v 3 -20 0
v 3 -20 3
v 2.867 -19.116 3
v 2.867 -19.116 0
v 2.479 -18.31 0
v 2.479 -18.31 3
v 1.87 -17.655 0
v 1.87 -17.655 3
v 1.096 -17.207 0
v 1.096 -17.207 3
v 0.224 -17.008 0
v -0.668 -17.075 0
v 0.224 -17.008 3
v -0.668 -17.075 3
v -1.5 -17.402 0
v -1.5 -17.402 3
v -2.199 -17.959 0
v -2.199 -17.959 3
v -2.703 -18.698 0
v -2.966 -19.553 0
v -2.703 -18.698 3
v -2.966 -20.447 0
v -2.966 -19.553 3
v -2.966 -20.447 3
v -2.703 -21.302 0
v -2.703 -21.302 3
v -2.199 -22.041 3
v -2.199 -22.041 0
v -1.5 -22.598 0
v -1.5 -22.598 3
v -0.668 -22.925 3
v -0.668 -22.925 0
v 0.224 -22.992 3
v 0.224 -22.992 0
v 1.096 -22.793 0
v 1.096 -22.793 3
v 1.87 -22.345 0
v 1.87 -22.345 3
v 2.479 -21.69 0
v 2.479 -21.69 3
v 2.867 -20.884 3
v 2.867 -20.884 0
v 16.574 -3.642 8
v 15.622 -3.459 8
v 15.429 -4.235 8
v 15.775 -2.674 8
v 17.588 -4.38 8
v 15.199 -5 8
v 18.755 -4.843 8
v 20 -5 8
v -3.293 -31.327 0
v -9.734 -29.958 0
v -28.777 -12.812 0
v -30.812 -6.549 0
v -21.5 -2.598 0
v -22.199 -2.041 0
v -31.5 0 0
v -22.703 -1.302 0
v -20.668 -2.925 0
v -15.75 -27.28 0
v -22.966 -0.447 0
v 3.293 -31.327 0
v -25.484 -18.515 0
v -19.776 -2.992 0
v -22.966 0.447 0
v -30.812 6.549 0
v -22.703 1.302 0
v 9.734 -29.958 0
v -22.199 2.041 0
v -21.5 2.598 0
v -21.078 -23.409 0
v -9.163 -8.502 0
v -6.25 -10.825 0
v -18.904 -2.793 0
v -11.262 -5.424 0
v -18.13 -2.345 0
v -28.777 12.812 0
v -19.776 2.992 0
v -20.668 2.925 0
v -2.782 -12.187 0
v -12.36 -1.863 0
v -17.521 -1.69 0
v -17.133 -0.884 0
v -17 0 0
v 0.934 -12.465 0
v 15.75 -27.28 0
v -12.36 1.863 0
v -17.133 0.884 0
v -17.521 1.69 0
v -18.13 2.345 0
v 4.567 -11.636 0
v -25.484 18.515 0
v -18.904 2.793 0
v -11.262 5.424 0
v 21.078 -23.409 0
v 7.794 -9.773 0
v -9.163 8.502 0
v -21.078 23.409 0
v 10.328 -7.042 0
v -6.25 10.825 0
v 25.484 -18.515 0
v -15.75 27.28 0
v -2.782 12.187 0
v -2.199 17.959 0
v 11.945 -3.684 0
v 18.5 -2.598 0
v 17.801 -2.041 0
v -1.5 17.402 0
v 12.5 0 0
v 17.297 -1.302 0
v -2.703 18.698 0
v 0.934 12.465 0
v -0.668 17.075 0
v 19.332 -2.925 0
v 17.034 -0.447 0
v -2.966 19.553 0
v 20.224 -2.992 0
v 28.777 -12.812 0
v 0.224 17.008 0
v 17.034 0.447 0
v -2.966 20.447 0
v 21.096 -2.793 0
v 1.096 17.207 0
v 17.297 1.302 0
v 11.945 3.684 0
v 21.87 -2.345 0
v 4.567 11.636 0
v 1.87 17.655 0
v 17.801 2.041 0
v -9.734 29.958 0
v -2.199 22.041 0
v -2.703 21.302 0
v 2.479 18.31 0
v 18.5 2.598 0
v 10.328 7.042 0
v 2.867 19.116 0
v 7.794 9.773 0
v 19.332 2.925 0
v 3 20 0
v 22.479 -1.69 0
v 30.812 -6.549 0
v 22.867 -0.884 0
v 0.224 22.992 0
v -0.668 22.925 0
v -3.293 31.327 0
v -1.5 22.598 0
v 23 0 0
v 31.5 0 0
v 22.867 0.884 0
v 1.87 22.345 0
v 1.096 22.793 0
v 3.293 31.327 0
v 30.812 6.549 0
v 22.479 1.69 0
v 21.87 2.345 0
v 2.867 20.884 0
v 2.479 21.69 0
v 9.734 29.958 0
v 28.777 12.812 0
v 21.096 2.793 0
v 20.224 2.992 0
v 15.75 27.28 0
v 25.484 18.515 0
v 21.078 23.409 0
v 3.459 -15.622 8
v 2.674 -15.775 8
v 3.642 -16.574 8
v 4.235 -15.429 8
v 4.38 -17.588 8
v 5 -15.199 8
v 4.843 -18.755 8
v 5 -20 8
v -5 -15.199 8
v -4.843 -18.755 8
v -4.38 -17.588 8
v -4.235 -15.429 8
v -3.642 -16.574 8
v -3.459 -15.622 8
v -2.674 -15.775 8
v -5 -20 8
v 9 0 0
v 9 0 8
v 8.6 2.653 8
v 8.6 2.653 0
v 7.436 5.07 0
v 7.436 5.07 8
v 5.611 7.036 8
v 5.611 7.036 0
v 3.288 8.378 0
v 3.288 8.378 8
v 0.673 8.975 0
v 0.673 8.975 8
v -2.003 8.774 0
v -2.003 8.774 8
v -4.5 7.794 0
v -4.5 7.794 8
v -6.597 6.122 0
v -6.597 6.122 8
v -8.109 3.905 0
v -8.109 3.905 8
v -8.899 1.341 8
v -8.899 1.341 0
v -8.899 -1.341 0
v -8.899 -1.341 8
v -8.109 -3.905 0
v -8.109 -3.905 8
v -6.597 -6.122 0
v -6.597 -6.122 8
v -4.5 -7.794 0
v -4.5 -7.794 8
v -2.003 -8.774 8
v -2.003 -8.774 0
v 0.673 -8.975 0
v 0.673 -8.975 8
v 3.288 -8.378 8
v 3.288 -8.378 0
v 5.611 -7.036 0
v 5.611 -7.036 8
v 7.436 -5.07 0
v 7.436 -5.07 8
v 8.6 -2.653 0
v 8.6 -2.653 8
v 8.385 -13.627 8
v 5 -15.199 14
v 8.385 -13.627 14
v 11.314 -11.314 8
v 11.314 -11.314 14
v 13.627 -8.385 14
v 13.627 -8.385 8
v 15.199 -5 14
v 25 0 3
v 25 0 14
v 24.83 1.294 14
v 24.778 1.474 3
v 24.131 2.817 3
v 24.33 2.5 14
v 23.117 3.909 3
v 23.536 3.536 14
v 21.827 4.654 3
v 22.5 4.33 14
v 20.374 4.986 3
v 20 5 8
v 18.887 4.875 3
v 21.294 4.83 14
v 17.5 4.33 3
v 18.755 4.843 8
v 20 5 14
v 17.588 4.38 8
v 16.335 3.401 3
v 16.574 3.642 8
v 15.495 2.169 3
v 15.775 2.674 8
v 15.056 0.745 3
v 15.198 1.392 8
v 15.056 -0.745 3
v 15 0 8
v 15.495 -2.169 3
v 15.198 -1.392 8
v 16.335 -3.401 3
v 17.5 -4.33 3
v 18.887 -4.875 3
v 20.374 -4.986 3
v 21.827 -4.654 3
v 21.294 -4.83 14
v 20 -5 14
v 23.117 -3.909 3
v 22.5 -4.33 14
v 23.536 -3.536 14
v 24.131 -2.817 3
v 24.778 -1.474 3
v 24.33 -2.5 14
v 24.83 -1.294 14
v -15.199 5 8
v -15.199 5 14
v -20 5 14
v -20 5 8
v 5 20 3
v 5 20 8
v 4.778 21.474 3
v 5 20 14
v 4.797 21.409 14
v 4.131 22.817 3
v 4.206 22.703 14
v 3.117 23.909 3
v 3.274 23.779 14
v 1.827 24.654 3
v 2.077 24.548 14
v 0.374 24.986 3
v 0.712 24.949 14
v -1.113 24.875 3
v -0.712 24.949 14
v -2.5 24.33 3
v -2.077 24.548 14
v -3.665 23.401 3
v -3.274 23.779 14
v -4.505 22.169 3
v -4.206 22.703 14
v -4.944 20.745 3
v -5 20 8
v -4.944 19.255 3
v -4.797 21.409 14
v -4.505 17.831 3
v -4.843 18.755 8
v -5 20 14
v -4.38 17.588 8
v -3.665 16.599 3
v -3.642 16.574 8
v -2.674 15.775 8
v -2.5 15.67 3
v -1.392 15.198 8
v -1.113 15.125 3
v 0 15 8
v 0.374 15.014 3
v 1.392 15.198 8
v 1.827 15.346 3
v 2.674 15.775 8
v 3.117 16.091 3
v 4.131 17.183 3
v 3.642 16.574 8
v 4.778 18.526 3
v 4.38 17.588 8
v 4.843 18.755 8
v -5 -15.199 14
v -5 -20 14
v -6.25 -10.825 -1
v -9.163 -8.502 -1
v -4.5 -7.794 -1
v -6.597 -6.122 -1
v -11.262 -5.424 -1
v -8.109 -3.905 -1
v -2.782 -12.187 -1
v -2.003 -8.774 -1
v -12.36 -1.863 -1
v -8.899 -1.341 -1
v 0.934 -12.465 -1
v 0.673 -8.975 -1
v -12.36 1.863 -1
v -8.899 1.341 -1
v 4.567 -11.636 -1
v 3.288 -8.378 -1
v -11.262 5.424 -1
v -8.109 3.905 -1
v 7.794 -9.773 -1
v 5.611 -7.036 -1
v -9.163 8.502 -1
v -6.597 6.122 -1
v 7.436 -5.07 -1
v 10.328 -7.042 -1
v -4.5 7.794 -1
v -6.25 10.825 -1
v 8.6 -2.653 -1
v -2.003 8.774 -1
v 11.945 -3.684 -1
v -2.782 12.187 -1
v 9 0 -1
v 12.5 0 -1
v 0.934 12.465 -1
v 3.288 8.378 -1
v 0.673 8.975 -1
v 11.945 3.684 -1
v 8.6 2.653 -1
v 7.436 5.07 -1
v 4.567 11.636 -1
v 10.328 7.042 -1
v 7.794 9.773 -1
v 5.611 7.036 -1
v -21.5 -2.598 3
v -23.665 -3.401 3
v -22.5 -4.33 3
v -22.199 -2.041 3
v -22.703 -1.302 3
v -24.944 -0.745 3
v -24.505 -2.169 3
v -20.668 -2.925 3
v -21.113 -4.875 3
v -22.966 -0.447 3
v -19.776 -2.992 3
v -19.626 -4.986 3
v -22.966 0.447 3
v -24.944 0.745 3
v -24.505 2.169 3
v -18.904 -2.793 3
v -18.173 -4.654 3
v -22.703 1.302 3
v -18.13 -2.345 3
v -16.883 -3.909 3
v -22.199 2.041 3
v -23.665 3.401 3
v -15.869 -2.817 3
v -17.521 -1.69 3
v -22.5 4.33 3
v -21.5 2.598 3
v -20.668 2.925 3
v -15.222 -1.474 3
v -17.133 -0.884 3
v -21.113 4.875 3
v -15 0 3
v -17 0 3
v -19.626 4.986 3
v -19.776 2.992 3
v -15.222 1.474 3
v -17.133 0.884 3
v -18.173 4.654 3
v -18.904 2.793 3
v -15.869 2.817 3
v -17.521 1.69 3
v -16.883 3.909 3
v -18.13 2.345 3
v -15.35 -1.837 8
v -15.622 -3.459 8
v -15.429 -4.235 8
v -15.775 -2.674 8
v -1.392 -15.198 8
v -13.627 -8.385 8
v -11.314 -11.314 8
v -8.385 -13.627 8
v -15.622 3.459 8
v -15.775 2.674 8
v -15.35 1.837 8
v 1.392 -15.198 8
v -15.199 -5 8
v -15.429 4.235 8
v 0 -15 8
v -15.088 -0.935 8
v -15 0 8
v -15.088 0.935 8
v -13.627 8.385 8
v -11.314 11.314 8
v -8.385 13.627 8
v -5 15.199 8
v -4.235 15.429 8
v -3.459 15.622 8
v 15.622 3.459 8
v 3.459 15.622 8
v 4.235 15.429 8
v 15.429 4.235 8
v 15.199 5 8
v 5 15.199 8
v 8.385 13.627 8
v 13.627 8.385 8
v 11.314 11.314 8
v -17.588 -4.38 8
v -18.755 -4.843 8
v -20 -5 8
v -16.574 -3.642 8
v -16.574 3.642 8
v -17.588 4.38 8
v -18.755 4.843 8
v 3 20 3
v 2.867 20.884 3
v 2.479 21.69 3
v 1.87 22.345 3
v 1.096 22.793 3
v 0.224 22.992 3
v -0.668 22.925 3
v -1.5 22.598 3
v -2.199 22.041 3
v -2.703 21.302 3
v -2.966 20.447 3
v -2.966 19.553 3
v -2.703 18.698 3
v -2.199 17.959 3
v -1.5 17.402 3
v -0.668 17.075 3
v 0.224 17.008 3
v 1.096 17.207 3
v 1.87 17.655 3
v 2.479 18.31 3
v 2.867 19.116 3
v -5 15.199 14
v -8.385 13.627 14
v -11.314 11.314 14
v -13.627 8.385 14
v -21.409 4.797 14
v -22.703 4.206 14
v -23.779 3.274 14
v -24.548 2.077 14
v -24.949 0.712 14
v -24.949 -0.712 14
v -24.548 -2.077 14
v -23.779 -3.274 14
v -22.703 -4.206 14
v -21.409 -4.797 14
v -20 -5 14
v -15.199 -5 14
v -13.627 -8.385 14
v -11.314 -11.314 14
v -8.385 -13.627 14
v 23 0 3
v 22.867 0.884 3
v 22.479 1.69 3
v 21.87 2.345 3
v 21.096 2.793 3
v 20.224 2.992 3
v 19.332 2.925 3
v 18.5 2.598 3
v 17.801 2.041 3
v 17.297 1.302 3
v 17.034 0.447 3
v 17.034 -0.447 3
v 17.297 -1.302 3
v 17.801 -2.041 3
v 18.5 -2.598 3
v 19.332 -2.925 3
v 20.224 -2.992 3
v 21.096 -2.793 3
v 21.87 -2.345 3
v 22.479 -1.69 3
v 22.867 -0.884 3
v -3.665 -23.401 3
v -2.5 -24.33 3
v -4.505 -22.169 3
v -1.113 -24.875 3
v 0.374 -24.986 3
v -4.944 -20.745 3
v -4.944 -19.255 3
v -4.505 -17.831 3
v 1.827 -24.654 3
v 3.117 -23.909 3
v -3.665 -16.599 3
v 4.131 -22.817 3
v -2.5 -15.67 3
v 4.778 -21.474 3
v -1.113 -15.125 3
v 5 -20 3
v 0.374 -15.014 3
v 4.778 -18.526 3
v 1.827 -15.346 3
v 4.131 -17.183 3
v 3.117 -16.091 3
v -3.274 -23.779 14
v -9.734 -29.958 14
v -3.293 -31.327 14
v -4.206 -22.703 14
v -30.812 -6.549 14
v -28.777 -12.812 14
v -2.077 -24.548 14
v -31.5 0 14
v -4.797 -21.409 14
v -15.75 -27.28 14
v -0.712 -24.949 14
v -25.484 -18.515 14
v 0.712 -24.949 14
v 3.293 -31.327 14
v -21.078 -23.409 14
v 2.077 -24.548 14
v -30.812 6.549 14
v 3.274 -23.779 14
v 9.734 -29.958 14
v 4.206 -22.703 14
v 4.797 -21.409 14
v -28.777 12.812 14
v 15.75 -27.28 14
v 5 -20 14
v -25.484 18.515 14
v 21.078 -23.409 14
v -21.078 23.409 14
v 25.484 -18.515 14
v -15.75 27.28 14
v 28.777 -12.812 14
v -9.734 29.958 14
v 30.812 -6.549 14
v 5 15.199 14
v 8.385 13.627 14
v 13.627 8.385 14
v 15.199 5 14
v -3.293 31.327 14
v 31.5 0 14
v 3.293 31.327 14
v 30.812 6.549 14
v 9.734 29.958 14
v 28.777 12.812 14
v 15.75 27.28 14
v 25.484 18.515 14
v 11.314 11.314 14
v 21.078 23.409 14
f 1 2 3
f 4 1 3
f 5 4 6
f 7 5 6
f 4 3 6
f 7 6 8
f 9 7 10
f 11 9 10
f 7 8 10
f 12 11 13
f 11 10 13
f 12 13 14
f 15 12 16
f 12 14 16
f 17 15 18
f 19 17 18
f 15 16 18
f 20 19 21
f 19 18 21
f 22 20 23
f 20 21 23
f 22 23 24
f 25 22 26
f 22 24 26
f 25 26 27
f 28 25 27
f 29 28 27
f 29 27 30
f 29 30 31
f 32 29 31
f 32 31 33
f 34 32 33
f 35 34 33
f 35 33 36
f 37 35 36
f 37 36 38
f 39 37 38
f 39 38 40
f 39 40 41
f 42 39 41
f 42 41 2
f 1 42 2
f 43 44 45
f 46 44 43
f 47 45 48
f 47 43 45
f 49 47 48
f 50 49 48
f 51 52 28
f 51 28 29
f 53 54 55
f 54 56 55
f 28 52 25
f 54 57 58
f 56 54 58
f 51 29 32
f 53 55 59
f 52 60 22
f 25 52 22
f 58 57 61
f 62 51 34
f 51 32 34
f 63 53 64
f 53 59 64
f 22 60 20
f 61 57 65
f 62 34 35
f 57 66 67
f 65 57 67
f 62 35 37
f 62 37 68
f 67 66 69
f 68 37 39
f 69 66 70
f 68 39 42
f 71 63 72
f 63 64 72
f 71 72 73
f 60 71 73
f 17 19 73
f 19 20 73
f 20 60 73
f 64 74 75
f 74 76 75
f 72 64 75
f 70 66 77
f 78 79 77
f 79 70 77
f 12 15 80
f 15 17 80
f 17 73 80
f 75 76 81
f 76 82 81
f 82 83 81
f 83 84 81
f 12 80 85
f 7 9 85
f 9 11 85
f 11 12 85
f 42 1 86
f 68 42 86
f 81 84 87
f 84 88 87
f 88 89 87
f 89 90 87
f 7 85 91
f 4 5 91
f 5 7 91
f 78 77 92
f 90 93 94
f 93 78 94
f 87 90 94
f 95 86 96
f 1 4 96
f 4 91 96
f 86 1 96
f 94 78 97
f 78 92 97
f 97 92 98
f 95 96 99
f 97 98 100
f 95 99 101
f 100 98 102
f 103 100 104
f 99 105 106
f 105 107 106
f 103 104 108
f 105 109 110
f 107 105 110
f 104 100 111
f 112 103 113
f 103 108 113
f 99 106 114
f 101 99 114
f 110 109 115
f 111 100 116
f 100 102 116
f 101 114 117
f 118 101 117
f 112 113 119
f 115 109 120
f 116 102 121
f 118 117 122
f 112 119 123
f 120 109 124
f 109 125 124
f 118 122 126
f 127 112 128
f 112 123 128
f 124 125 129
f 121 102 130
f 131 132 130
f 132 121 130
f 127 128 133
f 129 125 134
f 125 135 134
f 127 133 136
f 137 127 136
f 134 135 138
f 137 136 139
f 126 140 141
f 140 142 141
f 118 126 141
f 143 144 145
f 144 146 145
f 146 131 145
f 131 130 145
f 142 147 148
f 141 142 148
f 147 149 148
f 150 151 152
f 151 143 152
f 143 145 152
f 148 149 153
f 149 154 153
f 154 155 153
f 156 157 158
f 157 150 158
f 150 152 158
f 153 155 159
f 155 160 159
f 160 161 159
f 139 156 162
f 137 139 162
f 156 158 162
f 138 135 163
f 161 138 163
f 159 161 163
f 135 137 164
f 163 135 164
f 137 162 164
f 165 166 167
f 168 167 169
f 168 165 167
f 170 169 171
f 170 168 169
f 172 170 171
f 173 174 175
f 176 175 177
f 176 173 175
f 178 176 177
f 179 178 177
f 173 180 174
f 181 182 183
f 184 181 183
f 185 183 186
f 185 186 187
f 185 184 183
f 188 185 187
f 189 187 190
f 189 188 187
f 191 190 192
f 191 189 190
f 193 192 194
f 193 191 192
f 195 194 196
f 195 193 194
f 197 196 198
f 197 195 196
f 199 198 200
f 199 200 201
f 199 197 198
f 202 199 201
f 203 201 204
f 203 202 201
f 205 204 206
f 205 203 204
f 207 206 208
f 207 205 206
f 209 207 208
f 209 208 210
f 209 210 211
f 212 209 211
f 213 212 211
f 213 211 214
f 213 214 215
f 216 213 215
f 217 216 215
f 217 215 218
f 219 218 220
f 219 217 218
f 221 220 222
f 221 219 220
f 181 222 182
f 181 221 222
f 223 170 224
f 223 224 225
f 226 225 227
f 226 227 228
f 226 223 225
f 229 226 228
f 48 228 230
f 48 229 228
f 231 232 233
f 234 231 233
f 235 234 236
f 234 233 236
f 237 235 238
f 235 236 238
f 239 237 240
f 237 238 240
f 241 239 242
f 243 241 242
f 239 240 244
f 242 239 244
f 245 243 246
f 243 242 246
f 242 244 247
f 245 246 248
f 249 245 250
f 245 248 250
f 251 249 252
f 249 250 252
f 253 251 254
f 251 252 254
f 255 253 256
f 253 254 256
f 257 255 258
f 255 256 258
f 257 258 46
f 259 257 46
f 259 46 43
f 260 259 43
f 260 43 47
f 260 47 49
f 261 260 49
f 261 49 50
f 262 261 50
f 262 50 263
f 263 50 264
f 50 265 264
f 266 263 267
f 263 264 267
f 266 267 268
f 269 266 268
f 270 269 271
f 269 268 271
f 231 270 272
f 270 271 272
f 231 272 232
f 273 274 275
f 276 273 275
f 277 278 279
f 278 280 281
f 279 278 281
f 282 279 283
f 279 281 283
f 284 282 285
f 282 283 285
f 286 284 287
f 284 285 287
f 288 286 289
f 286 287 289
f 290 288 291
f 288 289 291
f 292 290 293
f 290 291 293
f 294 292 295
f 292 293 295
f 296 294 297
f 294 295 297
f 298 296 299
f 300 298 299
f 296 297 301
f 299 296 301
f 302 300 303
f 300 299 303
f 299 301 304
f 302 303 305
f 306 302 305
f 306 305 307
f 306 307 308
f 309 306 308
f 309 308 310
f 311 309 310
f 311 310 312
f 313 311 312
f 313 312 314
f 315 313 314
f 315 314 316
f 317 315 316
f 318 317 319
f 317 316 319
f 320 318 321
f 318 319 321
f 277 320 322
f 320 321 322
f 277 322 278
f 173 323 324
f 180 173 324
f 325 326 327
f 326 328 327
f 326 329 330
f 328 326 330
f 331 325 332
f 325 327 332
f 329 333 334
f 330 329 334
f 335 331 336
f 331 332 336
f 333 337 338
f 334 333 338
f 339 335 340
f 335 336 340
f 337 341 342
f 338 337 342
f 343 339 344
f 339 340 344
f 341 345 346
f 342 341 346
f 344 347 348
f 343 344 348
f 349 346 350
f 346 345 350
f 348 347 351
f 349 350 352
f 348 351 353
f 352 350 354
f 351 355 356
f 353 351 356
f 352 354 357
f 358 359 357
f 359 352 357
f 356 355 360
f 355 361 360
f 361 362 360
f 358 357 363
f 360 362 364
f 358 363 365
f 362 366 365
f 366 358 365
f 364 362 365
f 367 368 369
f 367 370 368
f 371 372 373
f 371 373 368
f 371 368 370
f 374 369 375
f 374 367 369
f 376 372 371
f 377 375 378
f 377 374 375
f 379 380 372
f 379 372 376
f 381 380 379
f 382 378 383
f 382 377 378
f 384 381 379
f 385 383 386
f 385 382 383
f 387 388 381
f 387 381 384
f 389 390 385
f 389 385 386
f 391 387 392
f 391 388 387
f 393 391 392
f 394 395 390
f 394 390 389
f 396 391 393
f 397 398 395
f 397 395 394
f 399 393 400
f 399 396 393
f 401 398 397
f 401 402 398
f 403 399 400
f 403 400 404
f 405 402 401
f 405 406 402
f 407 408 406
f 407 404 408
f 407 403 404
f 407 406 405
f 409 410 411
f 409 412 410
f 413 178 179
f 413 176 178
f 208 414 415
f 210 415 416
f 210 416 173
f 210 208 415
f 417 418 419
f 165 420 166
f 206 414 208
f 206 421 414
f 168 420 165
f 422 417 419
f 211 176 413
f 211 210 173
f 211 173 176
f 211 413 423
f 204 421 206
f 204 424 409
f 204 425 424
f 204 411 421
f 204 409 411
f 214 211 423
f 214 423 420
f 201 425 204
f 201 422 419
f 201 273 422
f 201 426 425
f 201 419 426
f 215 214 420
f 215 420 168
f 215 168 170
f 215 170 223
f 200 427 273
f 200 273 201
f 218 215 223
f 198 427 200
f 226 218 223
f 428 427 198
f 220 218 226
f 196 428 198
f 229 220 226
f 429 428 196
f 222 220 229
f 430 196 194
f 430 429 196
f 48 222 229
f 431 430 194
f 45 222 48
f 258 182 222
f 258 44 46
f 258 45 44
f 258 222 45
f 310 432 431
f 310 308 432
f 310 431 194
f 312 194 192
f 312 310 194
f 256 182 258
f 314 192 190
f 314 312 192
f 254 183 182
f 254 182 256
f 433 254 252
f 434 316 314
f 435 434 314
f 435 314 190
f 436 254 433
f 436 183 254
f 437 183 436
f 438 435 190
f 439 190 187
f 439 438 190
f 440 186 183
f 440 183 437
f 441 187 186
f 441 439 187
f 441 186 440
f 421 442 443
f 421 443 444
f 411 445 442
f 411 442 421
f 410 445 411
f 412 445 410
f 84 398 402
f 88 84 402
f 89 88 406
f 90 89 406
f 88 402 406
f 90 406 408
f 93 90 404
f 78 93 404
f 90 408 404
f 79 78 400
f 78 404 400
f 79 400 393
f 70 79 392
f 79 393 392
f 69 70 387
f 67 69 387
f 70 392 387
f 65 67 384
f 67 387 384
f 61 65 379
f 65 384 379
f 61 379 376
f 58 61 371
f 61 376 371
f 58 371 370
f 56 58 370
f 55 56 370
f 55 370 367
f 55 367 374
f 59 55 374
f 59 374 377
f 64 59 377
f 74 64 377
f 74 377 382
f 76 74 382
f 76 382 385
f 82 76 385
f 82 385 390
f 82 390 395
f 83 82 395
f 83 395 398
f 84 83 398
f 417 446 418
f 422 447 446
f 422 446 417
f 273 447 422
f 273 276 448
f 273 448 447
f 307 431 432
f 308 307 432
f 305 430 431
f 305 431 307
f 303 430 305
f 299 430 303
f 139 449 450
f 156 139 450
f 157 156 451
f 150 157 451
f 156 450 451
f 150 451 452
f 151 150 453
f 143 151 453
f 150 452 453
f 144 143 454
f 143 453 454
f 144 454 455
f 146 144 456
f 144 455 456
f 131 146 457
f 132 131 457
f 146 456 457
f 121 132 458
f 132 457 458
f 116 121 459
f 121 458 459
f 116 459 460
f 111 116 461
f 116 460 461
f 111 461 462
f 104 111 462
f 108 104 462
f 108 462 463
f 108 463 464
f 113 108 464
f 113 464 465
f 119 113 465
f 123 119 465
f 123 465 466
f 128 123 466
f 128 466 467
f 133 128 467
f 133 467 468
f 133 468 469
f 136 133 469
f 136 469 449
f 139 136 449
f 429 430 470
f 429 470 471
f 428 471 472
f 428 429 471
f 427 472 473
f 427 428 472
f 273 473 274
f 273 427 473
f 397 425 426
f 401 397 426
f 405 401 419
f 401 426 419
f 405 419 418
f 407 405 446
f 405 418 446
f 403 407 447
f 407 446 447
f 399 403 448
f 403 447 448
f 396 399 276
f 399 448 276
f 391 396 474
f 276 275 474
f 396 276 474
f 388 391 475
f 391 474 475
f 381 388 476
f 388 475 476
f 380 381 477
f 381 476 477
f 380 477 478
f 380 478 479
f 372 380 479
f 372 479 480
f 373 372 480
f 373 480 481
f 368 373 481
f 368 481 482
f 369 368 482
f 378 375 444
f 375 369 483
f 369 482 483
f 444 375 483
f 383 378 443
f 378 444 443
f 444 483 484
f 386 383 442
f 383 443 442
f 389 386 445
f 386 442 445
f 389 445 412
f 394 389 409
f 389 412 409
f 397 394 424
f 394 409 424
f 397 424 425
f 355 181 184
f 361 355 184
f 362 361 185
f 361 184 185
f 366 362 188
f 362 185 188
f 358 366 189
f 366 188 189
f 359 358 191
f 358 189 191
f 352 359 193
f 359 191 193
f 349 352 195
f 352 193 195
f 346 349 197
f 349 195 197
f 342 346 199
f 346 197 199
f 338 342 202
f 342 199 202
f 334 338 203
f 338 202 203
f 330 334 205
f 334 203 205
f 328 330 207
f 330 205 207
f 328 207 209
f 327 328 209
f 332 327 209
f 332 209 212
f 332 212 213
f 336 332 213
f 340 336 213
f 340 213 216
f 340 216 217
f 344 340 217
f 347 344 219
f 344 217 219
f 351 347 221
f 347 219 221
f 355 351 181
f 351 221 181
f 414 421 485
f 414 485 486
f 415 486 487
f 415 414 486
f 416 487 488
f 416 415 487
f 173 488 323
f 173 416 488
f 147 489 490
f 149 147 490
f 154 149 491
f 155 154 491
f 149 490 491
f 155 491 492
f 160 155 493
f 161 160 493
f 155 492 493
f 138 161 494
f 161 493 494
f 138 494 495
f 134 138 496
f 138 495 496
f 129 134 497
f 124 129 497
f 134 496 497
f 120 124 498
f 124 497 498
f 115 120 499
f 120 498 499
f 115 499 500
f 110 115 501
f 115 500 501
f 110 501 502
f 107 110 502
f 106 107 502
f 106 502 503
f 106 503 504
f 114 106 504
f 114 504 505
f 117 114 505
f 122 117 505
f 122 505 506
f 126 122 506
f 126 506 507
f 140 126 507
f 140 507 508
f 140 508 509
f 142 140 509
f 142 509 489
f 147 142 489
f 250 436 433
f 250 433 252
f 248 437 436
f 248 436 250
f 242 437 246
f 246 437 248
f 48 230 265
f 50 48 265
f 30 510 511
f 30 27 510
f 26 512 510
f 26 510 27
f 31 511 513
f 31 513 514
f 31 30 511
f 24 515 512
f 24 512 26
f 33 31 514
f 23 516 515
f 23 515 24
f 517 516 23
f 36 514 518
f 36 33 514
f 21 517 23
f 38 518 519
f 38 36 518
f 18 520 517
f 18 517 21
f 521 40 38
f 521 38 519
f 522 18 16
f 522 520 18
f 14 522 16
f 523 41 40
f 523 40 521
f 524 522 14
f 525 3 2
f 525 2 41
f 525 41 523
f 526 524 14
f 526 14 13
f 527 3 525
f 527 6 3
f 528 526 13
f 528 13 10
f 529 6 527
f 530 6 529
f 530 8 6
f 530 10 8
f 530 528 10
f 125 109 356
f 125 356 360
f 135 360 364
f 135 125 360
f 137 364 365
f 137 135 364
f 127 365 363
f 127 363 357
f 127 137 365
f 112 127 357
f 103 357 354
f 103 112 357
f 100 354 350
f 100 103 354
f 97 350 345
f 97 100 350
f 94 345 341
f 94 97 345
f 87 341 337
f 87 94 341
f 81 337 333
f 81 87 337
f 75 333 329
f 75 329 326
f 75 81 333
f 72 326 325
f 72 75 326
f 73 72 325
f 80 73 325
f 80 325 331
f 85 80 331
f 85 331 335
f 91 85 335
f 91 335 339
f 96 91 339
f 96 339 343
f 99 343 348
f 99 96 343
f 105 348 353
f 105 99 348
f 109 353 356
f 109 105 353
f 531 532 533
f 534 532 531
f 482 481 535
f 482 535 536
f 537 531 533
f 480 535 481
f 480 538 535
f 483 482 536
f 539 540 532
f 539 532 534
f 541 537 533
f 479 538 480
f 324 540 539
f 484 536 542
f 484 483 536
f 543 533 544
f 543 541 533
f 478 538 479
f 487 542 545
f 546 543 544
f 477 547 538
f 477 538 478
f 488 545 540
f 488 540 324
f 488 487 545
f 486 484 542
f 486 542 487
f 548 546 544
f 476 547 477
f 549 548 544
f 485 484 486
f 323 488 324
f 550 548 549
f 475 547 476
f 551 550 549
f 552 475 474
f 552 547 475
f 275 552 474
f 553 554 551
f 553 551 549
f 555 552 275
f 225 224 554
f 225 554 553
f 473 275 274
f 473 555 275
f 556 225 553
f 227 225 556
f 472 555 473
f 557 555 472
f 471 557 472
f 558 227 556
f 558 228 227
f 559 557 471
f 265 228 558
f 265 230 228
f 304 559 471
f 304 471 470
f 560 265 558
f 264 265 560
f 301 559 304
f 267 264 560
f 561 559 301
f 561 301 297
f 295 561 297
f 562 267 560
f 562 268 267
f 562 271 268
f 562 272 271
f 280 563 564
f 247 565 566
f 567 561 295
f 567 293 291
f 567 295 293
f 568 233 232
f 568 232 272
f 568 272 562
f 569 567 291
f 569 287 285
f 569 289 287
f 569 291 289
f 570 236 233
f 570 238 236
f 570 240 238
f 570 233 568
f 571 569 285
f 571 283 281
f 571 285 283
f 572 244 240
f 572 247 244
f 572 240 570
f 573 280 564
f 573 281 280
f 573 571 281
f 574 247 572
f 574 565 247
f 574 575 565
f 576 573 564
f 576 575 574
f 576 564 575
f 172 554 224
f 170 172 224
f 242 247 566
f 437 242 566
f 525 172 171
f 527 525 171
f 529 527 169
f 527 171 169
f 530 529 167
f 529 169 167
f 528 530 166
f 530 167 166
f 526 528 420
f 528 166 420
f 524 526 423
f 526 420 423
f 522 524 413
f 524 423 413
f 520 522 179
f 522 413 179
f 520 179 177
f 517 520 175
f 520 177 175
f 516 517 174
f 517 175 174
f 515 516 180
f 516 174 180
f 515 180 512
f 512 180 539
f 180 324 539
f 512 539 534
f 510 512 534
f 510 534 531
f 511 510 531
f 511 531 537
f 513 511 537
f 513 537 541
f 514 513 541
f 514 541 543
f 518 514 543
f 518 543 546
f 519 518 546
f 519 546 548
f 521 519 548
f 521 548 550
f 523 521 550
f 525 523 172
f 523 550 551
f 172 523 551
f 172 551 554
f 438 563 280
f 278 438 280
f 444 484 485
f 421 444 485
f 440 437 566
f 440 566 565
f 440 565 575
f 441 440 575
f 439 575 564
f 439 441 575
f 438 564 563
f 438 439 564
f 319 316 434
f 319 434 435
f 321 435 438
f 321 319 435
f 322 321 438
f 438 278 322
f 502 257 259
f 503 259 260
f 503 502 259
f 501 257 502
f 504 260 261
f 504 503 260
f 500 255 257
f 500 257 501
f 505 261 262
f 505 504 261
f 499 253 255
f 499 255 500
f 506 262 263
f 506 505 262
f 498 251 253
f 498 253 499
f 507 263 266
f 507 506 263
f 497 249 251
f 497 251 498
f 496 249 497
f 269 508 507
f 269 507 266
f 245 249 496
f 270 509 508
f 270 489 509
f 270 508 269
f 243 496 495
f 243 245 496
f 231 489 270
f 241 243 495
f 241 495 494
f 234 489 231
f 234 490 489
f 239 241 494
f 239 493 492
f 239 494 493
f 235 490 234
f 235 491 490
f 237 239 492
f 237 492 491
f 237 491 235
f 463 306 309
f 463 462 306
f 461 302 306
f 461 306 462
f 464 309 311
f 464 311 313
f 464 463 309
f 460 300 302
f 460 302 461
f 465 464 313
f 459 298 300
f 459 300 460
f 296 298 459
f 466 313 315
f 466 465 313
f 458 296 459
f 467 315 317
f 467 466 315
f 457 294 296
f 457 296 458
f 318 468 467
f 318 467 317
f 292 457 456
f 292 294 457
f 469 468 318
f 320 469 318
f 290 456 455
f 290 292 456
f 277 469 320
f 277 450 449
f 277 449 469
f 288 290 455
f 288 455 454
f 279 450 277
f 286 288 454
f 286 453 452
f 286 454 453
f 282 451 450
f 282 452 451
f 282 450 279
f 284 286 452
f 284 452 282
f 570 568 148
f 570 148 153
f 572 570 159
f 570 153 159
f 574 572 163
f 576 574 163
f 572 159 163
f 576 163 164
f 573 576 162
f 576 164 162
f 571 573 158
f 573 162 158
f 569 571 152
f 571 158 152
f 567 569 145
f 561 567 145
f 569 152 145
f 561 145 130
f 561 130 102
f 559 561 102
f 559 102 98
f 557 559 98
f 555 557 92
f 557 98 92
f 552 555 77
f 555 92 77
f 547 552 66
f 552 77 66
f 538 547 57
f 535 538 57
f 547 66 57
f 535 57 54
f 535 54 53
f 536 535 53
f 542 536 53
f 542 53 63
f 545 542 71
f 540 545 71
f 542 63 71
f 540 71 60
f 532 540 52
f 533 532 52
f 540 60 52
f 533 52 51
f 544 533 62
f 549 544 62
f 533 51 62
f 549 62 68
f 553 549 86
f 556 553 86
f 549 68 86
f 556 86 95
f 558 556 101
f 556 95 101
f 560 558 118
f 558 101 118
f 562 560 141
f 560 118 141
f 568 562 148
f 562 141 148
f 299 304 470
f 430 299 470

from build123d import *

# Parameters (mm, degrees)
SKETCH1_R           = 31.5
SKETCH1_R_2         = 16
BOSS_EXTRUDE1_DEPTH = 14
SKETCH1_3_R         = 16
SKETCH1_3_R_2       = 12.5
SKETCH1_3_R_3       = 9
BOSS_EXTRUDE2_DEPTH = 8
SKETCH1_4_R         = 12.5
SKETCH1_4_R_2       = 9
BOSS_EXTRUDE3_DEPTH = 1
SKETCH2_R           = 3
CUT_EXTRUDE1_DEPTH  = 16
CUT_EXTRUDE2_DEPTH  = 6
SKETCH2_4_R         = 5
CUT_EXTRUDE3_DEPTH  = 11


with BuildPart() as part:
    # Sketch1 → Boss-Extrude1 (new body)
    with BuildSketch(Plane.XY):
        Circle(SKETCH1_R)
        Circle(SKETCH1_R_2, mode=Mode.SUBTRACT)
    extrude(amount=BOSS_EXTRUDE1_DEPTH)

    # Sketch1<3> → Boss-Extrude2 (add)
    with BuildSketch(Plane.XY):
        Circle(SKETCH1_3_R)
        Circle(SKETCH1_3_R_2, mode=Mode.SUBTRACT)
        Circle(SKETCH1_3_R_2)
        Circle(SKETCH1_3_R_3, mode=Mode.SUBTRACT)
    extrude(amount=BOSS_EXTRUDE2_DEPTH)

    # Sketch1<4> → Boss-Extrude3 (add)
    with BuildSketch(Plane.XY):
        Circle(SKETCH1_4_R)
        Circle(SKETCH1_4_R_2, mode=Mode.SUBTRACT)
    extrude(amount=-BOSS_EXTRUDE3_DEPTH)

    # Sketch2 → Cut-Extrude1 (cut, through all)
    with BuildSketch(Plane.XY.offset(14)):
        with Locations((-20, 0)):
            Circle(SKETCH2_R)
        with Locations((0, 20)):
            Circle(SKETCH2_R)
        with Locations((20, 0)):
            Circle(SKETCH2_R)
        with Locations((0, -20)):
            Circle(SKETCH2_R)
    extrude(amount=-CUT_EXTRUDE1_DEPTH, mode=Mode.SUBTRACT)

    # Sketch2<3> → Cut-Extrude2 (cut)
    with BuildSketch(Plane.XY.offset(14)):
        with BuildLine():
            Line((-20, -5), (-15.198684154, -5))
            ThreePointArc((-15.198684154, -5), (-15.53045532, -3.847721084), (-15.775, -2.67383152))
            ThreePointArc((-15.775, -2.67383152), (-17.588481557, -4.380020411), (-20, -5))
        make_face()
        with BuildLine():
            ThreePointArc((-20, 5), (-17.588481557, 4.380020411), (-15.775, 2.67383152))
            ThreePointArc((-15.775, 2.67383152), (-15.53045532, 3.847721084), (-15.198684154, 5))
            Line((-15.198684154, 5), (-20, 5))
        make_face()
        with BuildLine():
            Line((-5, 20), (-5, 15.198684154))
            ThreePointArc((-5, 15.198684154), (-3.847721084, 15.53045532), (-2.67383152, 15.775))
            ThreePointArc((-2.67383152, 15.775), (-4.380020411, 17.588481557), (-5, 20))
        make_face()
        with BuildLine():
            Line((5, 15.198684154), (5, 20))
            ThreePointArc((5, 20), (4.380020411, 17.588481557), (2.67383152, 15.775))
            ThreePointArc((2.67383152, 15.775), (3.847721084, 15.53045532), (5, 15.198684154))
        make_face()
        with BuildLine():
            ThreePointArc((-2.67383152, -15.775), (-3.847721084, -15.53045532), (-5, -15.198684154))
            Line((-5, -15.198684154), (-5, -20))
            ThreePointArc((-5, -20), (-4.380020411, -17.588481557), (-2.67383152, -15.775))
        make_face()
        with BuildLine():
            ThreePointArc((2.67383152, -15.775), (4.380020411, -17.588481557), (5, -20))
            Line((5, -20), (5, -15.198684154))
            ThreePointArc((5, -15.198684154), (3.847721084, -15.53045532), (2.67383152, -15.775))
        make_face()
        with BuildLine():
            ThreePointArc((15.775, -2.67383152), (15.53045532, -3.847721084), (15.198684154, -5))
            Line((15.198684154, -5), (20, -5))
            ThreePointArc((20, -5), (17.588481557, -4.380020411), (15.775, -2.67383152))
        make_face()
        with BuildLine():
            Line((20, 5), (15.198684154, 5))
            ThreePointArc((15.198684154, 5), (15.53045532, 3.847721084), (15.775, 2.67383152))
            ThreePointArc((15.775, 2.67383152), (17.588481557, 4.380020411), (20, 5))
        make_face()
    extrude(amount=-CUT_EXTRUDE2_DEPTH, mode=Mode.SUBTRACT)

    # Sketch2<4> → Cut-Extrude3 (cut)
    with BuildSketch(Plane.XY.offset(14)):
        with Locations((-20, 0)):
            Circle(SKETCH2_4_R)
        with Locations((20, 0)):
            Circle(SKETCH2_4_R)
        with Locations((0, 20)):
            Circle(SKETCH2_4_R)
        with Locations((0, -20)):
            Circle(SKETCH2_4_R)
    extrude(amount=-CUT_EXTRUDE3_DEPTH, mode=Mode.SUBTRACT)


solid = part.part
